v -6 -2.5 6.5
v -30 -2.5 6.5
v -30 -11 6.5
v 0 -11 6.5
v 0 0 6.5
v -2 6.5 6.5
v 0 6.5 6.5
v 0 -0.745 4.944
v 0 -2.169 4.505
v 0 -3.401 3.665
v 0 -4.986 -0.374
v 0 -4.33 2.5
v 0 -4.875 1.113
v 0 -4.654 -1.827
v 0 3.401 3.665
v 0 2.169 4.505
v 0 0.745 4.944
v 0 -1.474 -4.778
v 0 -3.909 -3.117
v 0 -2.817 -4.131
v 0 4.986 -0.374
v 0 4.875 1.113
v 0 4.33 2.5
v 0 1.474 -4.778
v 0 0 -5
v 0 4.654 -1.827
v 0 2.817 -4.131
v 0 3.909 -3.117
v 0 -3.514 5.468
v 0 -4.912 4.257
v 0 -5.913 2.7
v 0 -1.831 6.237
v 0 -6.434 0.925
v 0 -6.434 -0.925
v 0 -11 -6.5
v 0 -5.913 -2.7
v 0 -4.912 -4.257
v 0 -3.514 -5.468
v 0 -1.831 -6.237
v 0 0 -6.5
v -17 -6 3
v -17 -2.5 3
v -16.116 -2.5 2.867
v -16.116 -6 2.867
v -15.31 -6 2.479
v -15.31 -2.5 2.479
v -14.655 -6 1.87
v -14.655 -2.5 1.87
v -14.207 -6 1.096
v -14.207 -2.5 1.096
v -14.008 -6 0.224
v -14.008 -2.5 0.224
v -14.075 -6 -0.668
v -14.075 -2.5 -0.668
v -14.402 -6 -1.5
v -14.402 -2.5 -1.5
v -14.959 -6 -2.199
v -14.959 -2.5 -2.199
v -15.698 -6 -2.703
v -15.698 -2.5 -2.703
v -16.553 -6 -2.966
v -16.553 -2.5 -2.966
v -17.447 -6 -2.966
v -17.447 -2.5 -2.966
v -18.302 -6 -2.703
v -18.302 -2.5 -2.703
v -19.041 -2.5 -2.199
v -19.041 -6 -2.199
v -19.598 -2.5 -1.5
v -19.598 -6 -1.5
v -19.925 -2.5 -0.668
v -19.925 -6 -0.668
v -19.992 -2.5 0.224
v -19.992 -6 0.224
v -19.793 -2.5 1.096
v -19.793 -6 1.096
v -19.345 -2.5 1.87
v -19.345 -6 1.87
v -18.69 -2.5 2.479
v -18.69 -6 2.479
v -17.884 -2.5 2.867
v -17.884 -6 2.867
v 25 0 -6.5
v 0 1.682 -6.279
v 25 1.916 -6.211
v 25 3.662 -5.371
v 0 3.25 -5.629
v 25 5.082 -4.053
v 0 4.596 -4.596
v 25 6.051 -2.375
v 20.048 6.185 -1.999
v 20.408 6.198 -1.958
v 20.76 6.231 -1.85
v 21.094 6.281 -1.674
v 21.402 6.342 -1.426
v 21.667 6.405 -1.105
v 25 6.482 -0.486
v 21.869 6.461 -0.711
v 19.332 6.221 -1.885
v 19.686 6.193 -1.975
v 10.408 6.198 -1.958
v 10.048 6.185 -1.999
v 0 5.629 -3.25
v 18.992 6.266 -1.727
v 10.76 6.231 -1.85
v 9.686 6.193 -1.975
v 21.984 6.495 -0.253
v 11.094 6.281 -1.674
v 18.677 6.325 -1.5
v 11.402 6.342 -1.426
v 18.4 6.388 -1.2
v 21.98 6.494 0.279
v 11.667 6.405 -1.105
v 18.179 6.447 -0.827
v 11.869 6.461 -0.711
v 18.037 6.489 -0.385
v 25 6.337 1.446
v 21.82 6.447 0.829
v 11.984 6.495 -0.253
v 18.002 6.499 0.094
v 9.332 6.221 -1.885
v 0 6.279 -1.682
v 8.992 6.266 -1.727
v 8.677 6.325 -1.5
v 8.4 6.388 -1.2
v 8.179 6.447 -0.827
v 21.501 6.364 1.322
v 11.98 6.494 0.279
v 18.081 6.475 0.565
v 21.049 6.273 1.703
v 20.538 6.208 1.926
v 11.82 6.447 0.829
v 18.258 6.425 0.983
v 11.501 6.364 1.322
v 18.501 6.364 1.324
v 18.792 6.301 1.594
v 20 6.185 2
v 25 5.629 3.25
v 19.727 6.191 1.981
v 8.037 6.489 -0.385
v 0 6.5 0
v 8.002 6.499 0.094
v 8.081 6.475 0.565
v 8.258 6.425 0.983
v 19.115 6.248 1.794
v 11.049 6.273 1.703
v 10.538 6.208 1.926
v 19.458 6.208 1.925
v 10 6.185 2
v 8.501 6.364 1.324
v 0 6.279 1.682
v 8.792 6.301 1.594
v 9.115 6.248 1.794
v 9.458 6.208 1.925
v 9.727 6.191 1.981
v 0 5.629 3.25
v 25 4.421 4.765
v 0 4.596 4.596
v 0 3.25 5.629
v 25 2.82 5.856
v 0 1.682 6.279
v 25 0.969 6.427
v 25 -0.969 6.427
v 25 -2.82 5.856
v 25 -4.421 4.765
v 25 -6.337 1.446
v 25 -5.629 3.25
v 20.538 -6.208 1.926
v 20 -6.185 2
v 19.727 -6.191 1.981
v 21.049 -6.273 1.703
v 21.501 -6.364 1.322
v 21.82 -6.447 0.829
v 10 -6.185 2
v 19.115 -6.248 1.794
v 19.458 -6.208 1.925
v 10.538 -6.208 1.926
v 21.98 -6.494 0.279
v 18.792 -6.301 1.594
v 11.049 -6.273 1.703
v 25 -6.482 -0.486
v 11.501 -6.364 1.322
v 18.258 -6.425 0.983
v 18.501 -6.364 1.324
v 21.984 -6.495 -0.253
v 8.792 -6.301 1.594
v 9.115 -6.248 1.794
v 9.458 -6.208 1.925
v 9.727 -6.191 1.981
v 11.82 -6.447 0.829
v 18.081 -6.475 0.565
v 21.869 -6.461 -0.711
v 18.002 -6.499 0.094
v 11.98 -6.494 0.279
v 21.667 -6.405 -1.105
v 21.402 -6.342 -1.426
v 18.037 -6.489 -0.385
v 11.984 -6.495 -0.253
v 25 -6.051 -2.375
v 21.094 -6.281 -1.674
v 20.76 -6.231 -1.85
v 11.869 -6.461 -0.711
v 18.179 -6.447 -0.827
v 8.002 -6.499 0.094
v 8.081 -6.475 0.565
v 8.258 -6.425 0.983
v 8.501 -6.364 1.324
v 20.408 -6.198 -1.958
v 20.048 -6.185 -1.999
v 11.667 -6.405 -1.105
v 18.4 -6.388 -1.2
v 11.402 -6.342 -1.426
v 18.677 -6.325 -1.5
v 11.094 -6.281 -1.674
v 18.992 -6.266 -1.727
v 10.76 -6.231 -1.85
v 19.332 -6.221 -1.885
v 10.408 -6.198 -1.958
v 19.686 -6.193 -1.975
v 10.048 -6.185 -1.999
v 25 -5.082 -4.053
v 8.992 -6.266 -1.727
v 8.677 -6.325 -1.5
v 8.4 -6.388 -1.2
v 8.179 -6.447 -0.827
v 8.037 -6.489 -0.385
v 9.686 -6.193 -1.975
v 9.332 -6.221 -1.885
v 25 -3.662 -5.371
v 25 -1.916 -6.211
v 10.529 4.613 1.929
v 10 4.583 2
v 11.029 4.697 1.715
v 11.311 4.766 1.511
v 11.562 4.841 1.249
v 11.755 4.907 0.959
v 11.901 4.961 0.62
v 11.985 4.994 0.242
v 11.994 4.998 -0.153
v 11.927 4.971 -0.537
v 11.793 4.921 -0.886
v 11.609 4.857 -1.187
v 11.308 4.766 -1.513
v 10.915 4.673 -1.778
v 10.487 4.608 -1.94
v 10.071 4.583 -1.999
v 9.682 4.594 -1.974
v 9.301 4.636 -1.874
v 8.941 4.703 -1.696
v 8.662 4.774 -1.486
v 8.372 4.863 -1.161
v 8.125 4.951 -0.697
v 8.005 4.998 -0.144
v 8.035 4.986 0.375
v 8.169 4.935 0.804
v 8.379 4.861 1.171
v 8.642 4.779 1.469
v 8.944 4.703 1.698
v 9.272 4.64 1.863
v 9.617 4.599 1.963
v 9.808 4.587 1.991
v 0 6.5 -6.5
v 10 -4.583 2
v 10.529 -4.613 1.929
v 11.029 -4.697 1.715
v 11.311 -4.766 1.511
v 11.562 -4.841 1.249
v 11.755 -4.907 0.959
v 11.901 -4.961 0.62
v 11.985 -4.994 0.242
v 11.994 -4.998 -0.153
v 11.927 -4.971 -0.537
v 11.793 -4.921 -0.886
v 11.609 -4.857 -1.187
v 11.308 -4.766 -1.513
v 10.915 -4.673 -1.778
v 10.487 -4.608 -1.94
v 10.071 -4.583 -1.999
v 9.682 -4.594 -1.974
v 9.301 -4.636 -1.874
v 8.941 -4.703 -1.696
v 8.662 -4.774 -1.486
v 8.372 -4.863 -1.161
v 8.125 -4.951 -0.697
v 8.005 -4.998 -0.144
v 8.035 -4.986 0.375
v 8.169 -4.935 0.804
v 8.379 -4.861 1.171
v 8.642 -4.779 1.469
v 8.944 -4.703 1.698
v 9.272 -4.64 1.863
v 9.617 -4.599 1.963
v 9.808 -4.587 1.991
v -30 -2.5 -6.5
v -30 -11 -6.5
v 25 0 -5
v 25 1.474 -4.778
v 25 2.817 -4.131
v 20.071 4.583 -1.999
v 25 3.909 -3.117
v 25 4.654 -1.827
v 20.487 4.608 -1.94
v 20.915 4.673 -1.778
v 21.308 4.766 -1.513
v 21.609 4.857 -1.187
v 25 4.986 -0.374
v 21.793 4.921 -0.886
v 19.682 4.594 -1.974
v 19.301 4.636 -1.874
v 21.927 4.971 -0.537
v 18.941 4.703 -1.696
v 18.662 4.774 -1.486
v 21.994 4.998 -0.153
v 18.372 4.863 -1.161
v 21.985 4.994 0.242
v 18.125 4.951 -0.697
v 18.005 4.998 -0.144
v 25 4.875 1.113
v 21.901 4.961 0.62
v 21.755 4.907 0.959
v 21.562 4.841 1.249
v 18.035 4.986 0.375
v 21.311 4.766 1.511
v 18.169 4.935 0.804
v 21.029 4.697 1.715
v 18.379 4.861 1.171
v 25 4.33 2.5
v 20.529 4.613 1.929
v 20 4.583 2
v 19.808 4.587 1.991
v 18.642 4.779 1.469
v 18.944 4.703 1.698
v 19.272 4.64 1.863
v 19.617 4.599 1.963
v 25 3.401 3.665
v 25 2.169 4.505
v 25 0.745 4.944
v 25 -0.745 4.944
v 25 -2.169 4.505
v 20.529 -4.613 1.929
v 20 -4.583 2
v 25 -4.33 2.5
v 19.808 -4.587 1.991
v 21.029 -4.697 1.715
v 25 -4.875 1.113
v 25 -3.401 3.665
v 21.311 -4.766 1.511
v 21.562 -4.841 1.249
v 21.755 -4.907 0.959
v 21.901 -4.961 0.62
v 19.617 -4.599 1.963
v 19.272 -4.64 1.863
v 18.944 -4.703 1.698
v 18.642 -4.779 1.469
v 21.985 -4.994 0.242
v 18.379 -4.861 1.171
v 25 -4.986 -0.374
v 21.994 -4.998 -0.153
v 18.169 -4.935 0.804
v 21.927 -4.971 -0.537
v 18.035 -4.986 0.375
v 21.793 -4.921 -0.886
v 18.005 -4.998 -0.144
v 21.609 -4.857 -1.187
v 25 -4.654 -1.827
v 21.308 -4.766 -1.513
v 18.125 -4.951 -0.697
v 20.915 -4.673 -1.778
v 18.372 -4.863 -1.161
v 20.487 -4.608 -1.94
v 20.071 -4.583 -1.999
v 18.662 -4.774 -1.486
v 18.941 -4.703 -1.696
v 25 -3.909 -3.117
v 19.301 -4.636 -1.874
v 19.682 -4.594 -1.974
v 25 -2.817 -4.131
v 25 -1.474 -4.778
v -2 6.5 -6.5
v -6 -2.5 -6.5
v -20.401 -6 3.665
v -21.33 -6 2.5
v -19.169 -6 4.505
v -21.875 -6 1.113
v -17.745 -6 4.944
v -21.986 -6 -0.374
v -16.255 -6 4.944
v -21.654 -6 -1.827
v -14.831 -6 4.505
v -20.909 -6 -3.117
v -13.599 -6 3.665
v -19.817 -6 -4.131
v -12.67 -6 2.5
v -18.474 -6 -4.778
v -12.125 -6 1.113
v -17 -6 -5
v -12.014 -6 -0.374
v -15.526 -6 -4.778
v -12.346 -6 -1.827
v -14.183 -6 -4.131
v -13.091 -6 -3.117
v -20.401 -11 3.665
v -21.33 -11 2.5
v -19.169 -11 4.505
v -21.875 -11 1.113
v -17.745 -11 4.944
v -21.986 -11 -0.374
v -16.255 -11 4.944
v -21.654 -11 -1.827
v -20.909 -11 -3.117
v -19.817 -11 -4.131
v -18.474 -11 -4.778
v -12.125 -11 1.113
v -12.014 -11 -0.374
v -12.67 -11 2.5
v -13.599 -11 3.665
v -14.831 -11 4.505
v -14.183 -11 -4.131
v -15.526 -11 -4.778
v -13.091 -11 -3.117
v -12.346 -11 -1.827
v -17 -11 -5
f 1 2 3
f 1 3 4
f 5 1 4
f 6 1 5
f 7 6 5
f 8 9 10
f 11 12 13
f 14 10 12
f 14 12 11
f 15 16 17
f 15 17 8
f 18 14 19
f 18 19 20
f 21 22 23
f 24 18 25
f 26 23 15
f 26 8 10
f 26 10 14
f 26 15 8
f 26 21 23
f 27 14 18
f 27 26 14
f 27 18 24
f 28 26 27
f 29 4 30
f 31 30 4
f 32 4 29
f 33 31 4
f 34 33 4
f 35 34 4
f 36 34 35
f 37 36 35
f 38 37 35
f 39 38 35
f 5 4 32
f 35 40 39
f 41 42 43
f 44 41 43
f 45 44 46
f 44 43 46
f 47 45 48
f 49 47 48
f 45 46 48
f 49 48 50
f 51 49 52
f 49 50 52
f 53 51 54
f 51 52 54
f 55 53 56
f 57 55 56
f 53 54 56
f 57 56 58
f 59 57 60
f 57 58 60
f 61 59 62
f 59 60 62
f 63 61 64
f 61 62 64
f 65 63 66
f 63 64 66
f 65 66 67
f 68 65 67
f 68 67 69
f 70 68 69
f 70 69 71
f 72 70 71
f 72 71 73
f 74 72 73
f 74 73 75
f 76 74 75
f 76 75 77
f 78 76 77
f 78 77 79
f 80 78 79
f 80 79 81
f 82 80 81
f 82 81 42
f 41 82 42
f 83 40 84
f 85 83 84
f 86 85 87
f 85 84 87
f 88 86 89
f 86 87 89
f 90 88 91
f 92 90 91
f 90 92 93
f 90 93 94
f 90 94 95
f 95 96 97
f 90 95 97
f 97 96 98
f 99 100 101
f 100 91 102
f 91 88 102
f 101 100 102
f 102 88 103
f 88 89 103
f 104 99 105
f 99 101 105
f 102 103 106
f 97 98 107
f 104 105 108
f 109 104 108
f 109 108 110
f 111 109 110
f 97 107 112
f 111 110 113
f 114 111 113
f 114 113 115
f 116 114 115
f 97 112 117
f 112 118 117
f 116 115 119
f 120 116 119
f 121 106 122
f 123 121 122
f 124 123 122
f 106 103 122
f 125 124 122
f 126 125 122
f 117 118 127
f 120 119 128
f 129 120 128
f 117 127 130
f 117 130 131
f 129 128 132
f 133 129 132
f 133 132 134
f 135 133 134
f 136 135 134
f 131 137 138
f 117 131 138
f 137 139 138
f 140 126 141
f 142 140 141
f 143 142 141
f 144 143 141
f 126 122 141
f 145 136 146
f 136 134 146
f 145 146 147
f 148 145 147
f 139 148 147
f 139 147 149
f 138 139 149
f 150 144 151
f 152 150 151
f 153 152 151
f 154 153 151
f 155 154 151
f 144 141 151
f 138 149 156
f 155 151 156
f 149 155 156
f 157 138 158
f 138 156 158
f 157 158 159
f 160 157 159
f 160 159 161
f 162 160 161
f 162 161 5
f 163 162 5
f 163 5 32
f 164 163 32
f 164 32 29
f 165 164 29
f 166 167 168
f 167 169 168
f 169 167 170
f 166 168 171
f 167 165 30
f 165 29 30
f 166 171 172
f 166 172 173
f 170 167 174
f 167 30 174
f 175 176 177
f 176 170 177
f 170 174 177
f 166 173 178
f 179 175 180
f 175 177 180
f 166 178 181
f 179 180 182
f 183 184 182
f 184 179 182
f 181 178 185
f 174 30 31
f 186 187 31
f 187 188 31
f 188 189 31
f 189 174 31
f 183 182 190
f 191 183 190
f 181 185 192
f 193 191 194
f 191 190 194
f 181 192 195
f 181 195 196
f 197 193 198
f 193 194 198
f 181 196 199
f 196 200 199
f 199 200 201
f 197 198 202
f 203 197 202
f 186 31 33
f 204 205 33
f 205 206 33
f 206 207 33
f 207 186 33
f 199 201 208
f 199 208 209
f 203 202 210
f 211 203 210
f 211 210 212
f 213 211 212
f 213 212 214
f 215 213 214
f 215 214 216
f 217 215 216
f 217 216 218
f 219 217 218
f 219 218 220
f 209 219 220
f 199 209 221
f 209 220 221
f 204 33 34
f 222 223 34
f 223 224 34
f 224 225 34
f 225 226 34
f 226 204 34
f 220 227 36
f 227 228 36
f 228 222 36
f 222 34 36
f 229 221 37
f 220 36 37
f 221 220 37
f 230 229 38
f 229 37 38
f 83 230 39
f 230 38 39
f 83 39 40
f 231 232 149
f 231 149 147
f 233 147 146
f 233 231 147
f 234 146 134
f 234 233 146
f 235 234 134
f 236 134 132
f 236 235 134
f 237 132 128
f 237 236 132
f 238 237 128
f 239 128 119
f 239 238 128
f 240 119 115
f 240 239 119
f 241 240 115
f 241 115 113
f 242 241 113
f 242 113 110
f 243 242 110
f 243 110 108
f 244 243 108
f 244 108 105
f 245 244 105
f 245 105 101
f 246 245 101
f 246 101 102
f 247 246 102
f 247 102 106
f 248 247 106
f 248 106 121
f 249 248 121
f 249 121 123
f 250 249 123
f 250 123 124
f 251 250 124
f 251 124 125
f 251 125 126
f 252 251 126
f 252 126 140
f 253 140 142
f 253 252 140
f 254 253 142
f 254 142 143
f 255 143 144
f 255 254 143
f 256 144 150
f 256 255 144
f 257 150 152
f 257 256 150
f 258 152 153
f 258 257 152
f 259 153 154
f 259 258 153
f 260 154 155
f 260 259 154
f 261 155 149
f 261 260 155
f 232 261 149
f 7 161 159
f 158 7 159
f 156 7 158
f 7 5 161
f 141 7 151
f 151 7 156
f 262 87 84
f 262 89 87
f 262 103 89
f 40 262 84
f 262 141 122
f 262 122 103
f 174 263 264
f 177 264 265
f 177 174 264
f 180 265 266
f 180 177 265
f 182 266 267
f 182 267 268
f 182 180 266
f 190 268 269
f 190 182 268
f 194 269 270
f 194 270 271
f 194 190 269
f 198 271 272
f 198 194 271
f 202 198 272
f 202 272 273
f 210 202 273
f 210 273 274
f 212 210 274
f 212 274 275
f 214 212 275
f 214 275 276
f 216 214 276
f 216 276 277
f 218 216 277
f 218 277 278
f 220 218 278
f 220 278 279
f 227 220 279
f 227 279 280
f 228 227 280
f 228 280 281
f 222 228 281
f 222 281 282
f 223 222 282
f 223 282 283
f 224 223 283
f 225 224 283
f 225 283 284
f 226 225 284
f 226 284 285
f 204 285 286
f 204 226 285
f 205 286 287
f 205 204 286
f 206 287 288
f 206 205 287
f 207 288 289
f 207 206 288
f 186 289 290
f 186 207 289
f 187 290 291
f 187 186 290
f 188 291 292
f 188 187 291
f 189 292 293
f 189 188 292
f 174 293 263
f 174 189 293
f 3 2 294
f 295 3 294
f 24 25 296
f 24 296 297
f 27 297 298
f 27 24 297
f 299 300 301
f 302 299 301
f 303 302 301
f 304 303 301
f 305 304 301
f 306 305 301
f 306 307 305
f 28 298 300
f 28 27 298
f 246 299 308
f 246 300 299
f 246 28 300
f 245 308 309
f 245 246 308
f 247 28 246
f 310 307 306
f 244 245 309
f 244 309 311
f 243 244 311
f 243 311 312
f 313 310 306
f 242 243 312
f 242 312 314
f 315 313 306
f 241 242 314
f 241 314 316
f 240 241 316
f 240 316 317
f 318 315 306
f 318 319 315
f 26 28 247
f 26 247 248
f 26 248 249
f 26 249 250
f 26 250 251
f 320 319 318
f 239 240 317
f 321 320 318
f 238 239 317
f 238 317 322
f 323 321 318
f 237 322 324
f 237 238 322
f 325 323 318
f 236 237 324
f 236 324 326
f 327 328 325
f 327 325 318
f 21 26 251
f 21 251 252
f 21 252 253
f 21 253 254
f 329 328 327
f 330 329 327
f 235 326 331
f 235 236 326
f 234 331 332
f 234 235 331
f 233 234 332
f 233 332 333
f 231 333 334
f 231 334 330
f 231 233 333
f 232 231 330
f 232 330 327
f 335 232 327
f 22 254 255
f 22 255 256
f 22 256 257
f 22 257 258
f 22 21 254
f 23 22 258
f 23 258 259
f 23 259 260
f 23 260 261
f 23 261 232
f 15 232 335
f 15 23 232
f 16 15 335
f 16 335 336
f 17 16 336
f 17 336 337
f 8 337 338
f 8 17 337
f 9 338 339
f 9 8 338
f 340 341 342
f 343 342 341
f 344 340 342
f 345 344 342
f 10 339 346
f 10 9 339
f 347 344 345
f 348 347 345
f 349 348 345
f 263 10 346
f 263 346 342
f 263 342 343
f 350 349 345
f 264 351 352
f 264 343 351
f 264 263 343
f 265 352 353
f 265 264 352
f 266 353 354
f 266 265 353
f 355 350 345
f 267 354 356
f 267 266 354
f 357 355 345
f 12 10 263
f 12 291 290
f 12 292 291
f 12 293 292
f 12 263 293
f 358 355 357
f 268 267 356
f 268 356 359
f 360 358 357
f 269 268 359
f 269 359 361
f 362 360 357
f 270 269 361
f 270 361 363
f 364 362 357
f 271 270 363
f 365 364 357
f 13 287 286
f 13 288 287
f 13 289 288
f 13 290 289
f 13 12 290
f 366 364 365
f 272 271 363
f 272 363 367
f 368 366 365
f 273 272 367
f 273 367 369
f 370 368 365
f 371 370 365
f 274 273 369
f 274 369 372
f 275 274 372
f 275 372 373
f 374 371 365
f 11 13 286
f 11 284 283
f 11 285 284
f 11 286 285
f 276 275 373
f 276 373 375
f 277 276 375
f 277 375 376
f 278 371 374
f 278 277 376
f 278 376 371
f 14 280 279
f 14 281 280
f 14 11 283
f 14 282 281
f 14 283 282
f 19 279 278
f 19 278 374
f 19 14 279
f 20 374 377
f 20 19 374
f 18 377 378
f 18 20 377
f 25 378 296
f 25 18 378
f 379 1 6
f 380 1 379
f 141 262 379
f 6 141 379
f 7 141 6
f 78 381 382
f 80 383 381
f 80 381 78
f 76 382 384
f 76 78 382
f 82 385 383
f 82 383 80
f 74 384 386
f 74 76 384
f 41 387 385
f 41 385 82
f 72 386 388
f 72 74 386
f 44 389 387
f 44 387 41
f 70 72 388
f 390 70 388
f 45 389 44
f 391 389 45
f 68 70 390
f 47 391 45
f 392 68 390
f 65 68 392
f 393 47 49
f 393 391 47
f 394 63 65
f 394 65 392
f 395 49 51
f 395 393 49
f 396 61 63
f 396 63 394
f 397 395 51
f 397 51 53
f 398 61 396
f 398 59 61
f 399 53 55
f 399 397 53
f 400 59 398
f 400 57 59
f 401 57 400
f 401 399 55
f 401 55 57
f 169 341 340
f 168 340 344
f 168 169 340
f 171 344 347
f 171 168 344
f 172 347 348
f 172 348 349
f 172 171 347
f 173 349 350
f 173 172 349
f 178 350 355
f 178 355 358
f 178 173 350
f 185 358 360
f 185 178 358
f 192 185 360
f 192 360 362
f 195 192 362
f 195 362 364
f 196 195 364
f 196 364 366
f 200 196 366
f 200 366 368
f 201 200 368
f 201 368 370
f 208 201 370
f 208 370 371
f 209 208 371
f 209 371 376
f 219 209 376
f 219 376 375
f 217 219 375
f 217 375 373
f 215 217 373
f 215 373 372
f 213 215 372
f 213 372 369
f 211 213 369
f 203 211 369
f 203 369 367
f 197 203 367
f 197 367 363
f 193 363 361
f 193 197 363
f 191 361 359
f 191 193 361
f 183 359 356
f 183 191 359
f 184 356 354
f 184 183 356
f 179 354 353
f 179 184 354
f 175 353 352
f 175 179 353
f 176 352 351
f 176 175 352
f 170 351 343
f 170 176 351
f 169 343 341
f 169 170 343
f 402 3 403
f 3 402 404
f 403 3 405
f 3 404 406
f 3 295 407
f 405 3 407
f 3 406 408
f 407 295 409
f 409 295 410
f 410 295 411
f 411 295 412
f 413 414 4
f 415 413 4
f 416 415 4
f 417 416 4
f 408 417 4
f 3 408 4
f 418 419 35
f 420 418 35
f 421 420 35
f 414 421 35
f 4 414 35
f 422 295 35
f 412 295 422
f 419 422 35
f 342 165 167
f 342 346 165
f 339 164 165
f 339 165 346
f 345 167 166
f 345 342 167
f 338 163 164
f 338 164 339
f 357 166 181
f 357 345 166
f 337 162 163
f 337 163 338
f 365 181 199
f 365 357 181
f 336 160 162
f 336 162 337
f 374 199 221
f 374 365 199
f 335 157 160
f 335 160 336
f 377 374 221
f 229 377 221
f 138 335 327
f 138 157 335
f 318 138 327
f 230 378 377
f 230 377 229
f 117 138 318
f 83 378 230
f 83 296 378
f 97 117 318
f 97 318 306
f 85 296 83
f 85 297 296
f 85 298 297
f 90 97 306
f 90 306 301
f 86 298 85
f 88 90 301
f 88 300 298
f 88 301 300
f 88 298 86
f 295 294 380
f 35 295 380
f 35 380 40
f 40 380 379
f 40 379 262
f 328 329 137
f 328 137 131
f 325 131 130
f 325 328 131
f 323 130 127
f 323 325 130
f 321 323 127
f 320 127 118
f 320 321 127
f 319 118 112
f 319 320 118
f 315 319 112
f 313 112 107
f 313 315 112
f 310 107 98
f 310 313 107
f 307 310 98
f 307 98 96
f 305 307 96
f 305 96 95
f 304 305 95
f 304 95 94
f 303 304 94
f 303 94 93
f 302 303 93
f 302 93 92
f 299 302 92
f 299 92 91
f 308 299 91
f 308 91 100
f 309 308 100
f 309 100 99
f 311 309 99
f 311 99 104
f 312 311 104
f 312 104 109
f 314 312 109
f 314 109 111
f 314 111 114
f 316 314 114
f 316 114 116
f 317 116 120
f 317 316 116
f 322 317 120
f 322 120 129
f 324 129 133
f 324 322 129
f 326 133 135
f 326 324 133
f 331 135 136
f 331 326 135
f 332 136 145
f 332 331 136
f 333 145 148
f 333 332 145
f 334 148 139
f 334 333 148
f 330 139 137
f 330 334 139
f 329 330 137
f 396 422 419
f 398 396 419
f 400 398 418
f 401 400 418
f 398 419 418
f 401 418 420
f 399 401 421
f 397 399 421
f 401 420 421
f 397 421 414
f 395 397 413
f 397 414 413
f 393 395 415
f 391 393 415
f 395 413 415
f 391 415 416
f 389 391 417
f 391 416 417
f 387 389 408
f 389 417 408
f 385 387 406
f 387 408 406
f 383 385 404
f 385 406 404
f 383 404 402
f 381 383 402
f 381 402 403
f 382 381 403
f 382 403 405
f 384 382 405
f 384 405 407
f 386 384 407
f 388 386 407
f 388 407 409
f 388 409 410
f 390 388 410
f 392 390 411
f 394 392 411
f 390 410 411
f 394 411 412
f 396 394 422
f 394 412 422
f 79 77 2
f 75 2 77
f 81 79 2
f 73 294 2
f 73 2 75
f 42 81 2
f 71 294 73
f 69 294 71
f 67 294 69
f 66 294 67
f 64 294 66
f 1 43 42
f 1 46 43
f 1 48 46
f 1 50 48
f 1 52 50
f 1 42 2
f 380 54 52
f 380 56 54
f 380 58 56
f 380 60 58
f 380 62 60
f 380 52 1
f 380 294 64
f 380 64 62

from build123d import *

# Parameters (mm, degrees)
SKETCH1_R               = 6.5
SKETCH1_R_2             = 5
BOSS_EXTRUDE1_DEPTH     = 25
BOSS_EXTRUDE2_DEPTH     = 2
CUT_EXTRUDE1_DEPTH      = 29.075790283
CUT_EXTRUDE1_DEPTH_BACK = 29.075790283
SKETCH4_R               = 2
SKETCH3_W               = 28
SKETCH3_H               = 13
SKETCH3_R               = 3
BOSS_EXTRUDE3_DEPTH     = 8.5
SKETCH5_R               = 5
CUT_EXTRUDE2_DEPTH      = 5
CHAMFER1_SIZE2          = 4
CHAMFER1_SIZE           = 9


with BuildPart() as part:
    # Sketch1 → Boss-Extrude1 (new body)
    with BuildSketch(Plane(origin=(0, 0, 0), x_dir=(0, 0, -1), z_dir=(1, 0, 0))):
        Circle(SKETCH1_R)
        Circle(SKETCH1_R_2, mode=Mode.SUBTRACT)
    extrude(amount=BOSS_EXTRUDE1_DEPTH)

    # Sketch2 → Boss-Extrude2 (add)
    with BuildSketch(Plane(origin=(0, 0, 0), x_dir=(0, 0, -1), z_dir=(1, 0, 0))):
        Polygon((-6.5, -6.5), (-6.5, -11), (6.5, -11), (6.5, -6.5), (6.5, 6.5), (-6.5, 6.5), align=None)
    extrude(amount=-BOSS_EXTRUDE2_DEPTH)

    # Sketch4 → Cut-Extrude1 (cut, two sides: drawn at the far end of the back side and taken through both)
    with BuildSketch(Plane(origin=(0, 0, 0), x_dir=(1, 0, 0), z_dir=(0, 1, 0)).offset(-CUT_EXTRUDE1_DEPTH_BACK)):
        with Locations(Location((10, 0, 0), (0, 0, 270))):
            Circle(SKETCH4_R)
        with Locations(Location((20, 0, 0), (0, 0, 270))):
            Circle(SKETCH4_R)
    extrude(amount=CUT_EXTRUDE1_DEPTH + CUT_EXTRUDE1_DEPTH_BACK, mode=Mode.SUBTRACT)

    # Sketch3 → Boss-Extrude3 (add)
    with BuildSketch(Plane(origin=(0, -2.5, 0), x_dir=(1, 0, 0), z_dir=(0, 1, 0))):
        with Locations((-16, 0)):
            Rectangle(SKETCH3_W, SKETCH3_H)
        with Locations(Location((-17, 0, 0), (0, 0, 270))):
            Circle(SKETCH3_R, mode=Mode.SUBTRACT)
    extrude(amount=-BOSS_EXTRUDE3_DEPTH)

    # Sketch5 → Cut-Extrude2 (cut)
    with BuildSketch(Plane.XZ.offset(11)):
        with Locations(Location((-17, 0, 0), (0, 0, 270))):
            Circle(SKETCH5_R)
    extrude(amount=-CUT_EXTRUDE2_DEPTH, mode=Mode.SUBTRACT)

    # Chamfer1
    chamfer1_edges = [part.edges().sort_by_distance(p)[0] for p in [
        (-2, -2.5, 0),
    ]]
    chamfer1_side = [part.faces().sort_by_distance(p)[0] for p in [
        (-2, -2.42, 0),
    ]]
    chamfer(chamfer1_edges, length=CHAMFER1_SIZE - 0.0001, length2=CHAMFER1_SIZE2 - 0.0001, reference=chamfer1_side[0])  # a hair under: the kernel refuses the full size


solid = part.part
